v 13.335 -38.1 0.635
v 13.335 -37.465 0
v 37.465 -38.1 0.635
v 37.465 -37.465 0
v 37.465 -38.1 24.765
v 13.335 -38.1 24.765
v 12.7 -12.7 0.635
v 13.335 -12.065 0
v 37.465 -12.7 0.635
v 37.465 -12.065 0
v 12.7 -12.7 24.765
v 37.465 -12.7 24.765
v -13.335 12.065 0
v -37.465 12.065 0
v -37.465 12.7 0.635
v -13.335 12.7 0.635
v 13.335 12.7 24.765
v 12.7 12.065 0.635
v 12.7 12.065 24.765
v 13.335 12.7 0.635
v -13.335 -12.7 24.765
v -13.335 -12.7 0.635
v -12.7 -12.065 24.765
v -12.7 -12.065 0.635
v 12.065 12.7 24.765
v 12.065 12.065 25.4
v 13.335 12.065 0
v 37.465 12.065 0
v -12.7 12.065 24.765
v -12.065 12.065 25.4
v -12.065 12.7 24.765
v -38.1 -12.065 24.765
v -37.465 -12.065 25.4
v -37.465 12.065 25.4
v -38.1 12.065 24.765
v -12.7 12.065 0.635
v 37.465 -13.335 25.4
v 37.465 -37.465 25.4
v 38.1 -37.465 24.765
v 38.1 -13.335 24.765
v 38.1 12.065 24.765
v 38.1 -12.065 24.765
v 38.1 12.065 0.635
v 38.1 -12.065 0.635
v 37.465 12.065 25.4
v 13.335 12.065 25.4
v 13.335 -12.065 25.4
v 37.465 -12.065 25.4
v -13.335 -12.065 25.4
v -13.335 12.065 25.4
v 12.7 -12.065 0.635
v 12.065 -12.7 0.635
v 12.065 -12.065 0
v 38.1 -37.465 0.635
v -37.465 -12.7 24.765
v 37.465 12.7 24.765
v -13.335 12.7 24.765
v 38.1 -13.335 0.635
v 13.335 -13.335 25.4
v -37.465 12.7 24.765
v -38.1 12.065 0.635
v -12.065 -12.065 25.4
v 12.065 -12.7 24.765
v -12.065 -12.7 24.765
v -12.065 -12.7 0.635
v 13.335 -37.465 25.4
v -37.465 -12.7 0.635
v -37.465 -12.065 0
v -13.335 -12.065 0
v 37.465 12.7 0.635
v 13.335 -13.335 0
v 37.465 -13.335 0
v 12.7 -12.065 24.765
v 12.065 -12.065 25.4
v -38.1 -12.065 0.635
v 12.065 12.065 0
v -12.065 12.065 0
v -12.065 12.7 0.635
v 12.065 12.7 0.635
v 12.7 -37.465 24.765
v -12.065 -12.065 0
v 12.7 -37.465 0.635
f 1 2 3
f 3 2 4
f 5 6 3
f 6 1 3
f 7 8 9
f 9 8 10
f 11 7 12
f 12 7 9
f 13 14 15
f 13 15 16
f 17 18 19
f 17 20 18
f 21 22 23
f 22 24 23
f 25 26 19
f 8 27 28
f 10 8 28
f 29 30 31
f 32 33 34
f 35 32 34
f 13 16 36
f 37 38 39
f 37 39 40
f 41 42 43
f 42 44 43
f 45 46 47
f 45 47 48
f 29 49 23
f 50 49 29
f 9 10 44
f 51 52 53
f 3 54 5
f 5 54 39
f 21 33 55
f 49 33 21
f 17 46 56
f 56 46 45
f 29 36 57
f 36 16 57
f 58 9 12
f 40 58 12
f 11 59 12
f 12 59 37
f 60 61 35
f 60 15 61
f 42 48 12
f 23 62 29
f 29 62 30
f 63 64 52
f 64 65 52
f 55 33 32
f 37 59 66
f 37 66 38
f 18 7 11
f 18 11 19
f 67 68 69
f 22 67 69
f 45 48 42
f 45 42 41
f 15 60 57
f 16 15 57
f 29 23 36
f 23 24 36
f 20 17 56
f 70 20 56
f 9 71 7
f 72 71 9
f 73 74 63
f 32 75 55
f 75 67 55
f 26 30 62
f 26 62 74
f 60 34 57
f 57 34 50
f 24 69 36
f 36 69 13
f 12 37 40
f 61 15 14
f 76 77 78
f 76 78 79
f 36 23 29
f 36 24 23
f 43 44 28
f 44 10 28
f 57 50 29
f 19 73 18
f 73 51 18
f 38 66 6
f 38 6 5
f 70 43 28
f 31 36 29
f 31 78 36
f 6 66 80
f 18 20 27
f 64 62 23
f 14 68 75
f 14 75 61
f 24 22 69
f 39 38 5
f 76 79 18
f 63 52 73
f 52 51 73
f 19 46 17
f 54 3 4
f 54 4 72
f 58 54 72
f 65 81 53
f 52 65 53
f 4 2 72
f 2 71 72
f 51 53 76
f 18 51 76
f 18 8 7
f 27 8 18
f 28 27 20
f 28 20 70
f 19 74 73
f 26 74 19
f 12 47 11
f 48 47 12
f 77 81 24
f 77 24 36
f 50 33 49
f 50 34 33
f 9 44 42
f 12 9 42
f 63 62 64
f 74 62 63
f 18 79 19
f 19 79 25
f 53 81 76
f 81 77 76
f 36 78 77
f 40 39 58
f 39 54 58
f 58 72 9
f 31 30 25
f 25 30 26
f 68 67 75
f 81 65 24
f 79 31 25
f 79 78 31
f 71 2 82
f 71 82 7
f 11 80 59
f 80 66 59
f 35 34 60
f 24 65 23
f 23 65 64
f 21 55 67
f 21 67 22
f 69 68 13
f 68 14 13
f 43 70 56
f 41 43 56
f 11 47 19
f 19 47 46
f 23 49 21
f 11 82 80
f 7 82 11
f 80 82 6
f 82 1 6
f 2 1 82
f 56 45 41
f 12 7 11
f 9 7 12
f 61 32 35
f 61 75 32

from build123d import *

# Parameters (mm, degrees)
F0_W      = 25.4
F0_H      = 25.4
F1_DEPTH  = 25.4
F2_DEPTH  = 25.4
F3_DEPTH  = 25.4
F4_DEPTH  = 25.4
F5_SIZE   = 0.635
F5_2_SIZE = 0.635
F5_3_SIZE = 0.635
F5_4_SIZE = 0.635


with BuildPart() as f1:
    # F0 (on Top) → F1 (new body)
    with BuildSketch(Plane.XY):
        with Locations((-25.4, 0)):
            Rectangle(F0_W, F0_H)
    extrude(amount=F1_DEPTH)

    # F5
    f5_edges = [f1.edges().sort_by_distance(p)[0] for p in [
        (-25.4, -12.7, 25.4),
        (-12.7, 0, 25.4),
        (-25.4, 12.7, 25.4),
        (-38.1, 0, 25.4),
        (-38.1, -12.7, 12.7),
        (-12.7, -12.7, 12.7),
        (-25.4, -12.7, 0),
        (-12.7, 12.7, 12.7),
        (-38.1, 12.7, 12.7),
        (-25.4, 12.7, 0),
        (-12.7, 0, 0),
        (-38.1, 0, 0),
    ]]
    chamfer(f5_edges, length=F5_SIZE)


with BuildPart() as f2:
    # F0 (on Top) → F2 (new body)
    with BuildSketch(Plane.XY):
        with Locations((25.4, -25.4)):
            Rectangle(F0_W, F0_H)
    extrude(amount=F2_DEPTH)

    # F5#4
    f5_4_edges = [f2.edges().sort_by_distance(p)[0] for p in [
        (25.4, -12.7, 25.4),
        (12.7, -25.4, 25.4),
        (25.4, -38.1, 25.4),
        (38.1, -25.4, 25.4),
        (12.7, -38.1, 12.7),
        (38.1, -38.1, 12.7),
        (25.4, -38.1, 0),
        (38.1, -25.4, 0),
        (25.4, -12.7, 0),
        (12.7, -25.4, 0),
        (38.1, -12.7, 12.7),
    ]]
    chamfer(f5_4_edges, length=F5_4_SIZE)


with BuildPart() as f3:
    # F0 (on Top) → F3 (new body)
    with BuildSketch(Plane.XY):
        Rectangle(F0_W, F0_H)
    extrude(amount=F3_DEPTH)

    # F5#2
    f5_2_edges = [f3.edges().sort_by_distance(p)[0] for p in [
        (-12.7, 0, 25.4),
        (0, -12.7, 25.4),
        (12.7, 0, 25.4),
        (0, 12.7, 25.4),
        (-12.7, -12.7, 12.7),
        (12.7, -12.7, 12.7),
        (0, -12.7, 0),
        (-12.7, 12.7, 12.7),
        (12.7, 12.7, 12.7),
        (0, 12.7, 0),
        (-12.7, 0, 0),
        (12.7, 0, 0),
    ]]
    chamfer(f5_2_edges, length=F5_2_SIZE)


with BuildPart() as f4:
    # F0 (on Top) → F4 (new body)
    with BuildSketch(Plane.XY):
        with Locations((25.4, 0)):
            Rectangle(F0_W, F0_H)
    extrude(amount=F4_DEPTH)

    # F5#3
    f5_3_edges = [f4.edges().sort_by_distance(p)[0] for p in [
        (12.7, 0, 25.4),
        (25.4, -12.7, 25.4),
        (38.1, 0, 25.4),
        (25.4, 12.7, 25.4),
        (38.1, 0, 0),
        (12.7, 12.7, 12.7),
        (38.1, 12.7, 12.7),
        (25.4, 12.7, 0),
        (12.7, 0, 0),
        (25.4, -12.7, 0),
        (38.1, -12.7, 12.7),
    ]]
    chamfer(f5_3_edges, length=F5_3_SIZE)


solid = Compound([f1.part, f2.part, f3.part, f4.part])
